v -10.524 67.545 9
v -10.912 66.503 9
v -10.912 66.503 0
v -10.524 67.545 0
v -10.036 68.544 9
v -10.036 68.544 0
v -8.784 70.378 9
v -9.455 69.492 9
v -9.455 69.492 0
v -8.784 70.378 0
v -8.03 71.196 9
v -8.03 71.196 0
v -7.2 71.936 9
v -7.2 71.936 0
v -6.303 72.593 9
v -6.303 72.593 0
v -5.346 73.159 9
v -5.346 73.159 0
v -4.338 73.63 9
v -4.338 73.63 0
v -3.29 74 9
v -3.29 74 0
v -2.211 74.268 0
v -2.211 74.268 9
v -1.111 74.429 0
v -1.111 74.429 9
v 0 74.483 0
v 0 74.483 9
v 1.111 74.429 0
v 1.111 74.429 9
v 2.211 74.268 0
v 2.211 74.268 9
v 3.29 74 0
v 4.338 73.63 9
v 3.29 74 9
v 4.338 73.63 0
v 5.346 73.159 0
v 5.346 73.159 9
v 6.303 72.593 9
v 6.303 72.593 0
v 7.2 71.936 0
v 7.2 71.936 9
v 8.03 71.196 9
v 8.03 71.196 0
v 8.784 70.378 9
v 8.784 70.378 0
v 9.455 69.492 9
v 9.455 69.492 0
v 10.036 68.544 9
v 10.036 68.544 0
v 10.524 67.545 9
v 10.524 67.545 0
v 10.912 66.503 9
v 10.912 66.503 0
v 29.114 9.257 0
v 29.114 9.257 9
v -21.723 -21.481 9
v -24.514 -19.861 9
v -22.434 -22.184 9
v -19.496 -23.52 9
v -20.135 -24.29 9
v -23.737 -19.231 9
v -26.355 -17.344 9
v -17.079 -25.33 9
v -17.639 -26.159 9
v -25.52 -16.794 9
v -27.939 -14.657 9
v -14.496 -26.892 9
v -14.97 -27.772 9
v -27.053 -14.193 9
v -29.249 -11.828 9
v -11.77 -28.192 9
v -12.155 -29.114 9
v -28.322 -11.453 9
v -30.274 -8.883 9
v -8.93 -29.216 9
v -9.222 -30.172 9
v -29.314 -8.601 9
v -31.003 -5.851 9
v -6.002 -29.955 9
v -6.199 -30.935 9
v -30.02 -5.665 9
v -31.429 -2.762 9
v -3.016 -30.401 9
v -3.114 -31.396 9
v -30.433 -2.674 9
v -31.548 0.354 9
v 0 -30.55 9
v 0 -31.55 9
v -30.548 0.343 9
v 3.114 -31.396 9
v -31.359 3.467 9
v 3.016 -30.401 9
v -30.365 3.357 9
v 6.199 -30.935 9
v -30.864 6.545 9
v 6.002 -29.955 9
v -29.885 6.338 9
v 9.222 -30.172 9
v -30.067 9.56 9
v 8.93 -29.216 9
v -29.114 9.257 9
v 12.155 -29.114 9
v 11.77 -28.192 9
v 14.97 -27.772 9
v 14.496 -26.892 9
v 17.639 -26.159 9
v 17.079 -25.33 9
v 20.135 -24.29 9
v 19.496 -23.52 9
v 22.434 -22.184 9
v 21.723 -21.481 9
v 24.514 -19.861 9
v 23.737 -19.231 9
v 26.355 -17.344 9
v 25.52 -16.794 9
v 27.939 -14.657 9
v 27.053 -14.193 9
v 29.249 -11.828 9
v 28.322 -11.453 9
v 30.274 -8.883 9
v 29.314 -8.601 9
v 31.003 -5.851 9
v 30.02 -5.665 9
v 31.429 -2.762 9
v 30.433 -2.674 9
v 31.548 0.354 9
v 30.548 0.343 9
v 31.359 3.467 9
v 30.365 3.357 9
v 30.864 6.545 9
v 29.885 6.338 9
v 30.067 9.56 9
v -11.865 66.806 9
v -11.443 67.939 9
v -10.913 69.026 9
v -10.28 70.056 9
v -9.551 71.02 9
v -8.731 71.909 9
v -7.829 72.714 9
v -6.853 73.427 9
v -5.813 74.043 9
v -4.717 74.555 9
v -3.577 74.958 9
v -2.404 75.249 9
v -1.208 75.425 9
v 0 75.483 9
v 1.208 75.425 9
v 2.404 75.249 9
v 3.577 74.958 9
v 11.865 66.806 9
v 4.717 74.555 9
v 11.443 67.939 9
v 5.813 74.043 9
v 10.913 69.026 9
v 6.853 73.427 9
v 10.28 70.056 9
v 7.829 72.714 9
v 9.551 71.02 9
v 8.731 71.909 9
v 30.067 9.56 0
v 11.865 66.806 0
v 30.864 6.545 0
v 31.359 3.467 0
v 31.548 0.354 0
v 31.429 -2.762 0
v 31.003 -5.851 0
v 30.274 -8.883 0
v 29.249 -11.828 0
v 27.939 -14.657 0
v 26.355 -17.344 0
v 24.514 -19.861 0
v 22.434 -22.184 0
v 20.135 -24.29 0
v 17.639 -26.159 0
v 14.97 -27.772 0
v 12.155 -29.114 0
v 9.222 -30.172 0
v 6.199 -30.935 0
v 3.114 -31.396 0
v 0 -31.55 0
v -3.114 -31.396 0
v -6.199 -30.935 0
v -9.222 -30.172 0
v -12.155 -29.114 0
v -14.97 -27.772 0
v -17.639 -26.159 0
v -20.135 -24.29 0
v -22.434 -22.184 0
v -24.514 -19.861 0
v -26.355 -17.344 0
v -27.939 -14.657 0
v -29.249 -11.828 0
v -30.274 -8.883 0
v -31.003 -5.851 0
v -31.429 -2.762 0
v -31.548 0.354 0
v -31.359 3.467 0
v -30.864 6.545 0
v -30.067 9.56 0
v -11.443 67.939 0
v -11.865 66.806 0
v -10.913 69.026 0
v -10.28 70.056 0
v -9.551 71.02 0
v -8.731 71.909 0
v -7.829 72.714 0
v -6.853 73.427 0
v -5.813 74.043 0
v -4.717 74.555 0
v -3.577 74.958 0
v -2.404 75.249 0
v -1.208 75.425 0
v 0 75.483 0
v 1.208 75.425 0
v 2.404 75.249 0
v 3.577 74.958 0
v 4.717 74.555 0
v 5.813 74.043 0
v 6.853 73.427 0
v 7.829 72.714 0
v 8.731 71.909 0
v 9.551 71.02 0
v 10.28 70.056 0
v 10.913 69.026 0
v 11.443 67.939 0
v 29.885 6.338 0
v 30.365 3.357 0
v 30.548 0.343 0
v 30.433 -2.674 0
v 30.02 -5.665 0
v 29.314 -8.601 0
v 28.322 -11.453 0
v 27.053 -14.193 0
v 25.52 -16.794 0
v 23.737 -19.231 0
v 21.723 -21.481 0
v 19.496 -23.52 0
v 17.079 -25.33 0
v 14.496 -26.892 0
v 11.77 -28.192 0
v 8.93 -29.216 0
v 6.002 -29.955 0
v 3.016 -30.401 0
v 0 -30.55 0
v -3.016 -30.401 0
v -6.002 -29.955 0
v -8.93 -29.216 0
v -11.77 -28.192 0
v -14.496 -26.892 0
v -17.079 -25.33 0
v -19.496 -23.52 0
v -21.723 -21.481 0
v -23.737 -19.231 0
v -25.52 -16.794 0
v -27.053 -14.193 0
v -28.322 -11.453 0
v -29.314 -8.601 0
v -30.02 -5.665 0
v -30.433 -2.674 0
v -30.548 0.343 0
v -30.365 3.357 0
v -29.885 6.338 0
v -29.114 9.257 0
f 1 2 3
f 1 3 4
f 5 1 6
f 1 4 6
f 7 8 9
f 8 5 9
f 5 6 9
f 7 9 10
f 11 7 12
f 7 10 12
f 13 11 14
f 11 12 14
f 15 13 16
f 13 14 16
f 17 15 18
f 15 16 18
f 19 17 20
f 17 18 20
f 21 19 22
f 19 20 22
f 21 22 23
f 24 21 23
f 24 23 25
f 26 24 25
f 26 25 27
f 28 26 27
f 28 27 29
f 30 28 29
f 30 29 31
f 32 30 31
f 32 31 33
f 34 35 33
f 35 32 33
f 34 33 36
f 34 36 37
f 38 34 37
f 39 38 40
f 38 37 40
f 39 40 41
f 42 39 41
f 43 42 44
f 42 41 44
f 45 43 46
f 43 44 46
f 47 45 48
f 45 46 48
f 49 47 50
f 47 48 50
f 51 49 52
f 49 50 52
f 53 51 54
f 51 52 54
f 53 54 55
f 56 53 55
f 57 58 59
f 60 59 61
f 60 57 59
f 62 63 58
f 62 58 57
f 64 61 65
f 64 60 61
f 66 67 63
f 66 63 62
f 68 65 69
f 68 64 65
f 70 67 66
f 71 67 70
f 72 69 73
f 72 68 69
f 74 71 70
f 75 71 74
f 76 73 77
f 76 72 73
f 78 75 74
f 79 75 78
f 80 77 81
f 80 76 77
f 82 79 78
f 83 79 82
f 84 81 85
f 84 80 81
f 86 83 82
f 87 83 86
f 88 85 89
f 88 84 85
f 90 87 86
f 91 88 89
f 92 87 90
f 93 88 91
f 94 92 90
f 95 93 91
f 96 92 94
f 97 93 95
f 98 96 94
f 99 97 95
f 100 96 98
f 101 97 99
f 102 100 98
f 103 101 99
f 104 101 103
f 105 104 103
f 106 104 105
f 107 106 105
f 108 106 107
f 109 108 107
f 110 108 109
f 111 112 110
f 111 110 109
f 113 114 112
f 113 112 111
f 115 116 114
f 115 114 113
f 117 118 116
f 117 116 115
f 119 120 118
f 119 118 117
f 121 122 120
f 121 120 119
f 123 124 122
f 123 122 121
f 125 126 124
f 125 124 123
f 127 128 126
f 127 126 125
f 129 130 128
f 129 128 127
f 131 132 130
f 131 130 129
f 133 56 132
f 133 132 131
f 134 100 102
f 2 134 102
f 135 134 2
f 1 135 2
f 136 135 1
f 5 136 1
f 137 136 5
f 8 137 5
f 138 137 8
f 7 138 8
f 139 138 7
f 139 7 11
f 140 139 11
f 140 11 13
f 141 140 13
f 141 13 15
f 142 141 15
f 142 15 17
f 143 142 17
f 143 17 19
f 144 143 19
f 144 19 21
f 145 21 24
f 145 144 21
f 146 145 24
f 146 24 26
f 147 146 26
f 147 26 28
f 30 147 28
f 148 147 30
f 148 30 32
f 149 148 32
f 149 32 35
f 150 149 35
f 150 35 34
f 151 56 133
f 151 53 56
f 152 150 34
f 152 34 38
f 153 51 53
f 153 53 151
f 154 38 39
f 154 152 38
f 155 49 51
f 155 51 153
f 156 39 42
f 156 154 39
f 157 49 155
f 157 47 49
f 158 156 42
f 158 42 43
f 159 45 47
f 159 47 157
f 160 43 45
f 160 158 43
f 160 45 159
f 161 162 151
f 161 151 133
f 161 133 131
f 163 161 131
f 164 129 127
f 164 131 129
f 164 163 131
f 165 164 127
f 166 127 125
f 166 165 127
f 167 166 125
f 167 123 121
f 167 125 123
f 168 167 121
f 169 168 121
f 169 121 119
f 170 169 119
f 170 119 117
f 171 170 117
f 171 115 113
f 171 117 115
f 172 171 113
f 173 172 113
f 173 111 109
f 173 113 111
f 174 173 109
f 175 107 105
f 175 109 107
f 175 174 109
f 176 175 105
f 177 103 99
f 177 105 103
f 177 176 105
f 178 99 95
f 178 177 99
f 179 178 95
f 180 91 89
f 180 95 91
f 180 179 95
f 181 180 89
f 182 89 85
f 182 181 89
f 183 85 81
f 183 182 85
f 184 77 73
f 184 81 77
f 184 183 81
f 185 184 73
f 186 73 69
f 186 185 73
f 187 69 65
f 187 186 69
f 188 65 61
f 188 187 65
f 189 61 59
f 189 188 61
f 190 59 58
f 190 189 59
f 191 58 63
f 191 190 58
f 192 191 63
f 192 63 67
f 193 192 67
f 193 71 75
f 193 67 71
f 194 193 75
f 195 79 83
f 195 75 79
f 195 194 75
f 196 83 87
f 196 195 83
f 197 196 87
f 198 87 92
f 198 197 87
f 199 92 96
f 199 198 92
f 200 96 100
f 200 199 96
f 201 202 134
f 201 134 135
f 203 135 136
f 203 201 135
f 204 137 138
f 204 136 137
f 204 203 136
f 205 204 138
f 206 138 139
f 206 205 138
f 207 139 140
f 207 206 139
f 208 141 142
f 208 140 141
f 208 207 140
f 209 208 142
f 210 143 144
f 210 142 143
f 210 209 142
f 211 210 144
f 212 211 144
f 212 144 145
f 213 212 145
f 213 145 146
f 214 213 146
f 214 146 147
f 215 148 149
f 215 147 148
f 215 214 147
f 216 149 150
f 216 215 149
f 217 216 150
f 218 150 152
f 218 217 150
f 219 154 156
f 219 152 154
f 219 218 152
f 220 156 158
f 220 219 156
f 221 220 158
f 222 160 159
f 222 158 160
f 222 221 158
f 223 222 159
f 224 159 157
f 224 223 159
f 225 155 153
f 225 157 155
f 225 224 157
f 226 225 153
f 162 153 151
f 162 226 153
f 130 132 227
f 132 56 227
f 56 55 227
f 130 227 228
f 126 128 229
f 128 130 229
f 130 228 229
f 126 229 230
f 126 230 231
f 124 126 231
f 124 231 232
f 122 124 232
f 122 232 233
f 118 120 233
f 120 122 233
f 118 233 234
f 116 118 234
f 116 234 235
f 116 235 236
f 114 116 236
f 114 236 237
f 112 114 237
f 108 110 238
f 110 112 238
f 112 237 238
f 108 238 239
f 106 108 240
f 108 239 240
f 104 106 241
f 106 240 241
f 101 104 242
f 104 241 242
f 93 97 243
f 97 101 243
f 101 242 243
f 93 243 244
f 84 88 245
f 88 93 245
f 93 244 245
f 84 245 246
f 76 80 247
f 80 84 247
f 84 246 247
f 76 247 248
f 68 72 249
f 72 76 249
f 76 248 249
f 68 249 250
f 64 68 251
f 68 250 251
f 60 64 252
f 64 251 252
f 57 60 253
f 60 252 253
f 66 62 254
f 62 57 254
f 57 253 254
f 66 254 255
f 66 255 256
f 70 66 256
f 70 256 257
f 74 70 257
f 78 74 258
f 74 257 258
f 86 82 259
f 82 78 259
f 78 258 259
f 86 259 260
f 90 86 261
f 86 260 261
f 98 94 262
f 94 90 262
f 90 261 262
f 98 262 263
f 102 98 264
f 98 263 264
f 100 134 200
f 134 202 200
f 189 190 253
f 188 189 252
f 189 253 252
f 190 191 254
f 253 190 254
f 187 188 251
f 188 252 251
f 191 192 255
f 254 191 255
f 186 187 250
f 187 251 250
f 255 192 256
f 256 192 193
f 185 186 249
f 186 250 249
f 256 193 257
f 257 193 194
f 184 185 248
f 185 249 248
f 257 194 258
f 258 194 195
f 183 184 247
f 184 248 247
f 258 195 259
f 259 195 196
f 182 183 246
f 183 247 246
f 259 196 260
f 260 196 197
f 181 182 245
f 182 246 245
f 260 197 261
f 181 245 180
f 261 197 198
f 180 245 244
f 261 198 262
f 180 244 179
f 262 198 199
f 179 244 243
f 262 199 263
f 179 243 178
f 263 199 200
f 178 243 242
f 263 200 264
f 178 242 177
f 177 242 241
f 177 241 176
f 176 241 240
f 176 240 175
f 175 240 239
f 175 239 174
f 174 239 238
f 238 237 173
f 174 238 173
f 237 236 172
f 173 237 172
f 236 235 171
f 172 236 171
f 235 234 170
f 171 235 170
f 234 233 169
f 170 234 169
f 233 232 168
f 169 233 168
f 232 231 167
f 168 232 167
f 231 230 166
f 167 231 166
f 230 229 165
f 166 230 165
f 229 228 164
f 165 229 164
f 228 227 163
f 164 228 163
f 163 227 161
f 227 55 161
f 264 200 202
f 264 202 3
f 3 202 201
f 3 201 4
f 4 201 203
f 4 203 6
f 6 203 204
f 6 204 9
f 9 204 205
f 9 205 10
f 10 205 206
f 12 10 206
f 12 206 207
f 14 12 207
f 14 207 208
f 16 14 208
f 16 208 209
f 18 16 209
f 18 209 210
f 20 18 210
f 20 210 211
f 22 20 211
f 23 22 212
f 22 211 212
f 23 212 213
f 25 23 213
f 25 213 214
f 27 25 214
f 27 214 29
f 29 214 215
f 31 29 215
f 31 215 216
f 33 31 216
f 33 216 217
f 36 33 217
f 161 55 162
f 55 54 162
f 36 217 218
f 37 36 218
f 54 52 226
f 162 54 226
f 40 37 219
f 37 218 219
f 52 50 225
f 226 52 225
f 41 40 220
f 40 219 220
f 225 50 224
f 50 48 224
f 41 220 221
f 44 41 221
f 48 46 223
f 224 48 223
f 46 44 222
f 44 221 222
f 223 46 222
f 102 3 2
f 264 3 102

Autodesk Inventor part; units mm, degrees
ref_plane "YZ Plane" through (0, 0, 0) normal (1, 0, 0) x (0, 1, 0)
ref_plane "XZ Plane" through (0, 0, 0) normal (0, 1, 0) x (-1, 0, 0)
ref_plane "XY Plane" through (0, 0, 0) normal (0, 0, 1) x (1, 0, 0)
sketch "Sketch1" plane through (0, 0, 0) normal (0, 0, 1) x (1, 0, 0)
  arc A0 (0, 30.55) -> (-29.1137, 9.2571) centre (0, 0) ccw construction
  arc A1 (0, 51.5833) -> (10.9117, 66.5028) centre (0, 63.0333) ccw construction
  line L0 (10.9117, 66.5028) -> (29.1137, 9.2571)
  line L1 (-10.9117, 66.5028) -> (-29.1137, 9.2571)
  line L2 (0, 63.0333) -> (0, 0) construction
  arc A2 (-10.9117, 66.5028) -> (0, 51.5833) centre (0, 63.0333) ccw construction
  arc A3 (10.9117, 66.5028) -> (-10.9117, 66.5028) centre (0, 63.0333) ccw
  arc A4 (29.1137, 9.2571) -> (0, 30.55) centre (0, 0) ccw construction
  arc A5 (-29.1137, 9.2571) -> (29.1137, 9.2571) centre (0, 0) ccw
  arc A6 (-11.8647, 66.8058) -> (11.8647, 66.8058) centre (0, 63.0333) ccw construction
  arc A7 (30.0667, 9.5601) -> (-30.0667, 9.5601) centre (0, 0) ccw construction
  line L3 (-11.8647, 66.8058) -> (-30.0667, 9.5601)
  line L4 (11.8647, 66.8058) -> (30.0667, 9.5601)
  arc A8 (11.8647, 66.8058) -> (-11.8647, 66.8058) centre (0, 63.0333) ccw
  arc A9 (-30.0667, 9.5601) -> (30.0667, 9.5601) centre (0, 0) ccw
  dimension "d0" = 60.0698
  dimension "d1" = 22.9
  dimension "d2" = 61.1
  dimension "d3" = 24.9
  dimension "d4" = 63.1
extrude "Extrusion1" add sketch "Sketch1" along normal blind 9
ref_plane "Work Plane1" through (0, 0, 4.5) normal (0, 0, 1) x (1, 0, 0)
properties part number "Timming Belt - 165"
